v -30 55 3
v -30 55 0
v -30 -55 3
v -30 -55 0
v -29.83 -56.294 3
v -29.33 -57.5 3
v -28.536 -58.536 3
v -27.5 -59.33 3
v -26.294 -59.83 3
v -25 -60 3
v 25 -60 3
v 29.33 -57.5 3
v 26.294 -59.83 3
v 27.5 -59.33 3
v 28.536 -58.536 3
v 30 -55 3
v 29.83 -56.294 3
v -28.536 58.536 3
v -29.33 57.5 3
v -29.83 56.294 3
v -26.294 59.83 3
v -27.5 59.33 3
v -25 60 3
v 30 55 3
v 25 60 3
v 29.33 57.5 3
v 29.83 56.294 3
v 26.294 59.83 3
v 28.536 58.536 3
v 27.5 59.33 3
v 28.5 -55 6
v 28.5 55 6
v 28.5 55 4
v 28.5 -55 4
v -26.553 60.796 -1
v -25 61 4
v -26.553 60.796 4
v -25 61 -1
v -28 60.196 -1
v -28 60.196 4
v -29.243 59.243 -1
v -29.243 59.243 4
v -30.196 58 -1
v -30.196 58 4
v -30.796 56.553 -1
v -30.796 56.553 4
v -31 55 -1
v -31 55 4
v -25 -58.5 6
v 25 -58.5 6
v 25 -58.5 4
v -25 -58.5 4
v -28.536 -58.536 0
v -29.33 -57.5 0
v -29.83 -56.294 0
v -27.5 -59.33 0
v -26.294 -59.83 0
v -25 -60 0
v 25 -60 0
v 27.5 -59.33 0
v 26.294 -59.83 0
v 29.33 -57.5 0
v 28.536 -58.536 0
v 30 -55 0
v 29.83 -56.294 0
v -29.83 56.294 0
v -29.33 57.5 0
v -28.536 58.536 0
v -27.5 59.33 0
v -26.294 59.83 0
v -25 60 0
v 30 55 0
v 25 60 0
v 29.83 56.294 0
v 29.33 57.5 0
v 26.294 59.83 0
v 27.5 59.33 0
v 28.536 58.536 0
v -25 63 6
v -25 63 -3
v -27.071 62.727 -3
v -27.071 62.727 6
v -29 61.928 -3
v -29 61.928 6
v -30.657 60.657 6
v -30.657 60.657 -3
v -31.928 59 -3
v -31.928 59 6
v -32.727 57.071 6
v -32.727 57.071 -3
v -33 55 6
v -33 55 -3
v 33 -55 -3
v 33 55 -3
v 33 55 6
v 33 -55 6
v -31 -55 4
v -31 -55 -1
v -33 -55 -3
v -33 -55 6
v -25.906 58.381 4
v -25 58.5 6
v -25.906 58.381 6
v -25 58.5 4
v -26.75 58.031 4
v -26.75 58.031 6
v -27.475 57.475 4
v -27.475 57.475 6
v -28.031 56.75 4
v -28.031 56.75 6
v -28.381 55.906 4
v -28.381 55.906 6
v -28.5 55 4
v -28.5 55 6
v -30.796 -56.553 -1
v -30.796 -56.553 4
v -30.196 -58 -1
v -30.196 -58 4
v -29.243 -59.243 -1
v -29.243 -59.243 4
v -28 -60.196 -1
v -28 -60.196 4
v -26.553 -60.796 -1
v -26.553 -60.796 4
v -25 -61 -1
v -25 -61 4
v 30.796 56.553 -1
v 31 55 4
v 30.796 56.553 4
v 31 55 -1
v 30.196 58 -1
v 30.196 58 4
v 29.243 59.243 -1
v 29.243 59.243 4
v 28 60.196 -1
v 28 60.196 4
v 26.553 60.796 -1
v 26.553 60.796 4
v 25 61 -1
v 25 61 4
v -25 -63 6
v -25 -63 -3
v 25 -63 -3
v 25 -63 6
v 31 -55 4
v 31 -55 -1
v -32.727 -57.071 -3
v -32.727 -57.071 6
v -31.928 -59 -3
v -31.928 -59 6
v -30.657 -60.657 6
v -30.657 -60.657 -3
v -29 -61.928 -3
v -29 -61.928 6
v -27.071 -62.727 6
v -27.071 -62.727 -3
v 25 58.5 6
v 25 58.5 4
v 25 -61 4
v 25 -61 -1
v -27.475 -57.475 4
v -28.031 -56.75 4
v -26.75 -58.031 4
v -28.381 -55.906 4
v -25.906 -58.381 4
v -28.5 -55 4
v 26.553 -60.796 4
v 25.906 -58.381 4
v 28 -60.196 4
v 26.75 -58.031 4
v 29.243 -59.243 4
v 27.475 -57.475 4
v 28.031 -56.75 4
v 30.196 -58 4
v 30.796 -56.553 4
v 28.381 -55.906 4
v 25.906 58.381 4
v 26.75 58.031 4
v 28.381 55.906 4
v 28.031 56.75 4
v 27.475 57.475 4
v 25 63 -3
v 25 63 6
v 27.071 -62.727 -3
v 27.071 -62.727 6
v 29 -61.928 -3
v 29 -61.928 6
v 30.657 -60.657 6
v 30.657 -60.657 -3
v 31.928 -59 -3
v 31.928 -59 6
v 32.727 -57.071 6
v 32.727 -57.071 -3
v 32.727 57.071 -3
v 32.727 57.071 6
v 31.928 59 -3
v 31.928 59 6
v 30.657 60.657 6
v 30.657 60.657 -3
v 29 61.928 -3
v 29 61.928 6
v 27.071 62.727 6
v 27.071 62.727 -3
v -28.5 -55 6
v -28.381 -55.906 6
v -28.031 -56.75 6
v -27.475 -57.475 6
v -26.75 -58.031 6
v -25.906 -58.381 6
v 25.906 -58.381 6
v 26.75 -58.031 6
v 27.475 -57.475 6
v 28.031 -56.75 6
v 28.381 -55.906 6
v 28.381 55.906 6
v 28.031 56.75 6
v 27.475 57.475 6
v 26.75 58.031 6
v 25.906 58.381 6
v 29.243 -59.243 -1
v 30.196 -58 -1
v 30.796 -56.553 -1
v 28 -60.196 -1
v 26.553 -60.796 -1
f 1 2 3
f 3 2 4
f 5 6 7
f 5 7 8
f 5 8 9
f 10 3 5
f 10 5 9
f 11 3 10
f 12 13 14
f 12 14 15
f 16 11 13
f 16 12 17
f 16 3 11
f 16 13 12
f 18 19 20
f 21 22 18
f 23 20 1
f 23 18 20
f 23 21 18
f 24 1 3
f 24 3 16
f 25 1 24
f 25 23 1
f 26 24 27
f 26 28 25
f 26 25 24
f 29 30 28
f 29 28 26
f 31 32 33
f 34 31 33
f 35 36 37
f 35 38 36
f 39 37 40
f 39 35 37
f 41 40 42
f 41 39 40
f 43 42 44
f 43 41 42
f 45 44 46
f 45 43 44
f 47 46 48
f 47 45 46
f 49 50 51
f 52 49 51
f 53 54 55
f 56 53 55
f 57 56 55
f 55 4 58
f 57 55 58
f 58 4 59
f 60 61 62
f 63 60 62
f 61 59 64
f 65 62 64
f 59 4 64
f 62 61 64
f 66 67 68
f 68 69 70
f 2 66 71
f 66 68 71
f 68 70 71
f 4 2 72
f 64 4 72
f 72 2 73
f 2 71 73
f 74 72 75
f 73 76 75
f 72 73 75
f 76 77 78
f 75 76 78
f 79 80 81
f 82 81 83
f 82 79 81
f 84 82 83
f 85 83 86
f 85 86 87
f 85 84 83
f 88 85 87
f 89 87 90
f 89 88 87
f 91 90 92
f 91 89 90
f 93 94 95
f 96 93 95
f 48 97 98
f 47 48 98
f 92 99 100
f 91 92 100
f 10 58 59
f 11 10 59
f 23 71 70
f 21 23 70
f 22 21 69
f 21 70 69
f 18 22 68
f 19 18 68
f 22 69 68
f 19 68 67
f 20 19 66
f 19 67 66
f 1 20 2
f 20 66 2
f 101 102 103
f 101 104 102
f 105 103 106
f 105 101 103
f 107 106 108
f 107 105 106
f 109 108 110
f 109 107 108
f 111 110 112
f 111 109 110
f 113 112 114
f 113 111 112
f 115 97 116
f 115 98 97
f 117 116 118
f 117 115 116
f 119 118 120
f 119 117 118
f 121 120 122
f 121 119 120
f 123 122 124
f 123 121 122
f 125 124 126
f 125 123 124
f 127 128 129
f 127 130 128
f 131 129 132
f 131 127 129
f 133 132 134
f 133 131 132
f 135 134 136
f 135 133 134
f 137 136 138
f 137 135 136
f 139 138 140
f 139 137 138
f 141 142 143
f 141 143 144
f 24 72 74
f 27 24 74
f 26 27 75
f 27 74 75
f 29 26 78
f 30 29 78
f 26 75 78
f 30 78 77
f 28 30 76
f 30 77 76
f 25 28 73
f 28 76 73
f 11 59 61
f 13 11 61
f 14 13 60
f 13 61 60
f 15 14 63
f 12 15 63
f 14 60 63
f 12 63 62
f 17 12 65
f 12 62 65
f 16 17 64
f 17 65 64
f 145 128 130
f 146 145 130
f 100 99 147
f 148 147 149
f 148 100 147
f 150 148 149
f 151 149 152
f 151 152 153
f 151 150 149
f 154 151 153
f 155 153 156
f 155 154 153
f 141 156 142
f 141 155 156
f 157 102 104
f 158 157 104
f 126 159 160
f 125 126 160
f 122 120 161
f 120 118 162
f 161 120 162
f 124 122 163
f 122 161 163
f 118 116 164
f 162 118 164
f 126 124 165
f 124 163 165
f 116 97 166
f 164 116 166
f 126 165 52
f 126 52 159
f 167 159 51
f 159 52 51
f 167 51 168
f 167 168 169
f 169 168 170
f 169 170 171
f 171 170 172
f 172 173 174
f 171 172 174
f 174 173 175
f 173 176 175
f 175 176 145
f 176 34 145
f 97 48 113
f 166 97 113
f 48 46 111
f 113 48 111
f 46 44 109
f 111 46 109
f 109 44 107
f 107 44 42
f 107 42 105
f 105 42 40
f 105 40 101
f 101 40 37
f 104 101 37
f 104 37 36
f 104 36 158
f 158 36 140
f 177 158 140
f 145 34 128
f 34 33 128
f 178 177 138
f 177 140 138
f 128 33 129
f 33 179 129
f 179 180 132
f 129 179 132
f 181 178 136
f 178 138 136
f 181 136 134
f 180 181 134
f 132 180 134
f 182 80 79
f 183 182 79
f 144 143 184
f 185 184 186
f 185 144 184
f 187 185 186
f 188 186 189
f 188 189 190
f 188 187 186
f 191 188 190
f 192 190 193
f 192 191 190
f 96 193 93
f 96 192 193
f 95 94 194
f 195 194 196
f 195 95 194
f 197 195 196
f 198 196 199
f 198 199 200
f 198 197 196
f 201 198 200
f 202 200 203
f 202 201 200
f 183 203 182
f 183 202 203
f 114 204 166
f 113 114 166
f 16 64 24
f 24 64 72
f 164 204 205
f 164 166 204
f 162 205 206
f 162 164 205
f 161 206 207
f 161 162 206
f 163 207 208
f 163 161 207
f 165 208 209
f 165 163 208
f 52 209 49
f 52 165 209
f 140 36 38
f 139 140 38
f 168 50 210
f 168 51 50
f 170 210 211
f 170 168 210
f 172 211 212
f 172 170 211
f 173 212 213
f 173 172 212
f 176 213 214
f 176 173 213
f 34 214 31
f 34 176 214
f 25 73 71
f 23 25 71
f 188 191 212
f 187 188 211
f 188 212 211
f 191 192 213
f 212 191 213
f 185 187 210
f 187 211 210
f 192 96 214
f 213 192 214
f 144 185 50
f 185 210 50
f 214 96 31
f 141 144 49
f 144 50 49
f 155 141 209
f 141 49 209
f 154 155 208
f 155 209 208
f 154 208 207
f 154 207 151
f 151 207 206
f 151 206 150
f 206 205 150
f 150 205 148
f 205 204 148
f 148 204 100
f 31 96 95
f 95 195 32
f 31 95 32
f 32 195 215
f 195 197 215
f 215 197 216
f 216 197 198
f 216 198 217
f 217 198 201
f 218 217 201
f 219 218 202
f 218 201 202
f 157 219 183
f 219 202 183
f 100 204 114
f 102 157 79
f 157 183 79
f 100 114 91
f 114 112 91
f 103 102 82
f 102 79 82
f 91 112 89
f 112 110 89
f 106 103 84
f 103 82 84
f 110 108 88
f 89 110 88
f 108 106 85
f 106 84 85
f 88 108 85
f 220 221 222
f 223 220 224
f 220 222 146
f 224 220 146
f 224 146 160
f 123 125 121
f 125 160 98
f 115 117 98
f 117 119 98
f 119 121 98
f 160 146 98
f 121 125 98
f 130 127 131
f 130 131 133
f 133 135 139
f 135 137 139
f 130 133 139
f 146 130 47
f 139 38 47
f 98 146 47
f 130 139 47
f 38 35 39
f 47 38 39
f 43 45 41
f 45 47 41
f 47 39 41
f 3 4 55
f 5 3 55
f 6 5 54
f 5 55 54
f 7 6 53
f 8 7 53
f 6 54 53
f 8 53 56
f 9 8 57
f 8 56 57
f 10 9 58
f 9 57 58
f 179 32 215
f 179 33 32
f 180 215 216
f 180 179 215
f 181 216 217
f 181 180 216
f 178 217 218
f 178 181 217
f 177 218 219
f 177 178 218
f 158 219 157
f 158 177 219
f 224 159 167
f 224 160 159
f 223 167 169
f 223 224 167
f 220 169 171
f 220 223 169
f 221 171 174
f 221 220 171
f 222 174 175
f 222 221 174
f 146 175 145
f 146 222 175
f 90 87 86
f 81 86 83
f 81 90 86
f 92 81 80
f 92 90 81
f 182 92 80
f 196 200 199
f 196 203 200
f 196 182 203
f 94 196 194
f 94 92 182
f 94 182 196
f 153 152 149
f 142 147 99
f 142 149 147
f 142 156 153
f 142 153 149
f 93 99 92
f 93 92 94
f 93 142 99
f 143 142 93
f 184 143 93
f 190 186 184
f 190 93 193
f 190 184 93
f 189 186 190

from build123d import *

# Parameters (mm, degrees)
F2_DEPTH = 3
F6_DEPTH = 2


with BuildPart() as f2:
    # F1 (on Top) → F2 (new body)
    with BuildSketch(Plane.XY):
        with BuildLine():
            Line((-25, -60), (25, -60))
            ThreePointArc((25, -60), (28.5355339059, -58.5355339059), (30, -55))
            Line((30, -55), (30, 55))
            ThreePointArc((30, 55), (28.5355339059, 58.5355339059), (25, 60))
            Line((25, 60), (-25, 60))
            ThreePointArc((-25, 60), (-28.5355339059, 58.5355339059), (-30, 55))
            Line((-30, 55), (-30, -55))
            ThreePointArc((-30, -55), (-28.5355339059, -58.5355339059), (-25, -60))
        make_face()
    extrude(amount=F2_DEPTH)


with BuildPart() as f4:
    # F4: sweep along a path in F1
    with BuildLine(Plane.XY) as f4_path:
        Line((31, -55), (31, 0))
        Line((31, 0), (31, 55))
        ThreePointArc((31, 55), (29.2426406871, 59.2426406871), (25, 61))
        Line((25, 61), (-25, 61))
        ThreePointArc((-25, 61), (-29.2426406871, 59.2426406871), (-31, 55))
        Line((-31, 55), (-31, 0))
        Line((-31, 0), (-31, -55))
        ThreePointArc((-31, -55), (-29.2426406871, -59.2426406871), (-25, -61))
        Line((-25, -61), (25, -61))
        ThreePointArc((25, -61), (29.2426406871, -59.2426406871), (31, -55))
    # F3 (on Front) → F4 (sweep)
    with BuildSketch(Plane.XZ):
        Polygon((28.5, 6), (28.5, 4), (31, 4), (31, -1), (28.5, -1), (28.5, -3), (33, -3), (33, 6), align=None)
    sweep(path=f4_path.line)

    # F5 (on face) → F6 (join, through all)
    with BuildSketch(Plane(origin=(0, 0, -3), x_dir=(1, 0, 0), z_dir=(0, 0, -1))):
        with BuildLine():
            ThreePointArc((28.5, 55), (27.4748737342, 57.4748737342), (25, 58.5))
            Line((25, 58.5), (-25, 58.5))
            ThreePointArc((-25, 58.5), (-27.4748737342, 57.4748737342), (-28.5, 55))
            Line((-28.5, 55), (-28.5, -55))
            ThreePointArc((-28.5, -55), (-27.4748737342, -57.4748737342), (-25, -58.5))
            Line((-25, -58.5), (25, -58.5))
            ThreePointArc((25, -58.5), (27.4748737342, -57.4748737342), (28.5, -55))
            Line((28.5, -55), (28.5, 55))
        make_face()
    extrude(amount=-F6_DEPTH)


solid = Compound([f2.part, f4.part])
